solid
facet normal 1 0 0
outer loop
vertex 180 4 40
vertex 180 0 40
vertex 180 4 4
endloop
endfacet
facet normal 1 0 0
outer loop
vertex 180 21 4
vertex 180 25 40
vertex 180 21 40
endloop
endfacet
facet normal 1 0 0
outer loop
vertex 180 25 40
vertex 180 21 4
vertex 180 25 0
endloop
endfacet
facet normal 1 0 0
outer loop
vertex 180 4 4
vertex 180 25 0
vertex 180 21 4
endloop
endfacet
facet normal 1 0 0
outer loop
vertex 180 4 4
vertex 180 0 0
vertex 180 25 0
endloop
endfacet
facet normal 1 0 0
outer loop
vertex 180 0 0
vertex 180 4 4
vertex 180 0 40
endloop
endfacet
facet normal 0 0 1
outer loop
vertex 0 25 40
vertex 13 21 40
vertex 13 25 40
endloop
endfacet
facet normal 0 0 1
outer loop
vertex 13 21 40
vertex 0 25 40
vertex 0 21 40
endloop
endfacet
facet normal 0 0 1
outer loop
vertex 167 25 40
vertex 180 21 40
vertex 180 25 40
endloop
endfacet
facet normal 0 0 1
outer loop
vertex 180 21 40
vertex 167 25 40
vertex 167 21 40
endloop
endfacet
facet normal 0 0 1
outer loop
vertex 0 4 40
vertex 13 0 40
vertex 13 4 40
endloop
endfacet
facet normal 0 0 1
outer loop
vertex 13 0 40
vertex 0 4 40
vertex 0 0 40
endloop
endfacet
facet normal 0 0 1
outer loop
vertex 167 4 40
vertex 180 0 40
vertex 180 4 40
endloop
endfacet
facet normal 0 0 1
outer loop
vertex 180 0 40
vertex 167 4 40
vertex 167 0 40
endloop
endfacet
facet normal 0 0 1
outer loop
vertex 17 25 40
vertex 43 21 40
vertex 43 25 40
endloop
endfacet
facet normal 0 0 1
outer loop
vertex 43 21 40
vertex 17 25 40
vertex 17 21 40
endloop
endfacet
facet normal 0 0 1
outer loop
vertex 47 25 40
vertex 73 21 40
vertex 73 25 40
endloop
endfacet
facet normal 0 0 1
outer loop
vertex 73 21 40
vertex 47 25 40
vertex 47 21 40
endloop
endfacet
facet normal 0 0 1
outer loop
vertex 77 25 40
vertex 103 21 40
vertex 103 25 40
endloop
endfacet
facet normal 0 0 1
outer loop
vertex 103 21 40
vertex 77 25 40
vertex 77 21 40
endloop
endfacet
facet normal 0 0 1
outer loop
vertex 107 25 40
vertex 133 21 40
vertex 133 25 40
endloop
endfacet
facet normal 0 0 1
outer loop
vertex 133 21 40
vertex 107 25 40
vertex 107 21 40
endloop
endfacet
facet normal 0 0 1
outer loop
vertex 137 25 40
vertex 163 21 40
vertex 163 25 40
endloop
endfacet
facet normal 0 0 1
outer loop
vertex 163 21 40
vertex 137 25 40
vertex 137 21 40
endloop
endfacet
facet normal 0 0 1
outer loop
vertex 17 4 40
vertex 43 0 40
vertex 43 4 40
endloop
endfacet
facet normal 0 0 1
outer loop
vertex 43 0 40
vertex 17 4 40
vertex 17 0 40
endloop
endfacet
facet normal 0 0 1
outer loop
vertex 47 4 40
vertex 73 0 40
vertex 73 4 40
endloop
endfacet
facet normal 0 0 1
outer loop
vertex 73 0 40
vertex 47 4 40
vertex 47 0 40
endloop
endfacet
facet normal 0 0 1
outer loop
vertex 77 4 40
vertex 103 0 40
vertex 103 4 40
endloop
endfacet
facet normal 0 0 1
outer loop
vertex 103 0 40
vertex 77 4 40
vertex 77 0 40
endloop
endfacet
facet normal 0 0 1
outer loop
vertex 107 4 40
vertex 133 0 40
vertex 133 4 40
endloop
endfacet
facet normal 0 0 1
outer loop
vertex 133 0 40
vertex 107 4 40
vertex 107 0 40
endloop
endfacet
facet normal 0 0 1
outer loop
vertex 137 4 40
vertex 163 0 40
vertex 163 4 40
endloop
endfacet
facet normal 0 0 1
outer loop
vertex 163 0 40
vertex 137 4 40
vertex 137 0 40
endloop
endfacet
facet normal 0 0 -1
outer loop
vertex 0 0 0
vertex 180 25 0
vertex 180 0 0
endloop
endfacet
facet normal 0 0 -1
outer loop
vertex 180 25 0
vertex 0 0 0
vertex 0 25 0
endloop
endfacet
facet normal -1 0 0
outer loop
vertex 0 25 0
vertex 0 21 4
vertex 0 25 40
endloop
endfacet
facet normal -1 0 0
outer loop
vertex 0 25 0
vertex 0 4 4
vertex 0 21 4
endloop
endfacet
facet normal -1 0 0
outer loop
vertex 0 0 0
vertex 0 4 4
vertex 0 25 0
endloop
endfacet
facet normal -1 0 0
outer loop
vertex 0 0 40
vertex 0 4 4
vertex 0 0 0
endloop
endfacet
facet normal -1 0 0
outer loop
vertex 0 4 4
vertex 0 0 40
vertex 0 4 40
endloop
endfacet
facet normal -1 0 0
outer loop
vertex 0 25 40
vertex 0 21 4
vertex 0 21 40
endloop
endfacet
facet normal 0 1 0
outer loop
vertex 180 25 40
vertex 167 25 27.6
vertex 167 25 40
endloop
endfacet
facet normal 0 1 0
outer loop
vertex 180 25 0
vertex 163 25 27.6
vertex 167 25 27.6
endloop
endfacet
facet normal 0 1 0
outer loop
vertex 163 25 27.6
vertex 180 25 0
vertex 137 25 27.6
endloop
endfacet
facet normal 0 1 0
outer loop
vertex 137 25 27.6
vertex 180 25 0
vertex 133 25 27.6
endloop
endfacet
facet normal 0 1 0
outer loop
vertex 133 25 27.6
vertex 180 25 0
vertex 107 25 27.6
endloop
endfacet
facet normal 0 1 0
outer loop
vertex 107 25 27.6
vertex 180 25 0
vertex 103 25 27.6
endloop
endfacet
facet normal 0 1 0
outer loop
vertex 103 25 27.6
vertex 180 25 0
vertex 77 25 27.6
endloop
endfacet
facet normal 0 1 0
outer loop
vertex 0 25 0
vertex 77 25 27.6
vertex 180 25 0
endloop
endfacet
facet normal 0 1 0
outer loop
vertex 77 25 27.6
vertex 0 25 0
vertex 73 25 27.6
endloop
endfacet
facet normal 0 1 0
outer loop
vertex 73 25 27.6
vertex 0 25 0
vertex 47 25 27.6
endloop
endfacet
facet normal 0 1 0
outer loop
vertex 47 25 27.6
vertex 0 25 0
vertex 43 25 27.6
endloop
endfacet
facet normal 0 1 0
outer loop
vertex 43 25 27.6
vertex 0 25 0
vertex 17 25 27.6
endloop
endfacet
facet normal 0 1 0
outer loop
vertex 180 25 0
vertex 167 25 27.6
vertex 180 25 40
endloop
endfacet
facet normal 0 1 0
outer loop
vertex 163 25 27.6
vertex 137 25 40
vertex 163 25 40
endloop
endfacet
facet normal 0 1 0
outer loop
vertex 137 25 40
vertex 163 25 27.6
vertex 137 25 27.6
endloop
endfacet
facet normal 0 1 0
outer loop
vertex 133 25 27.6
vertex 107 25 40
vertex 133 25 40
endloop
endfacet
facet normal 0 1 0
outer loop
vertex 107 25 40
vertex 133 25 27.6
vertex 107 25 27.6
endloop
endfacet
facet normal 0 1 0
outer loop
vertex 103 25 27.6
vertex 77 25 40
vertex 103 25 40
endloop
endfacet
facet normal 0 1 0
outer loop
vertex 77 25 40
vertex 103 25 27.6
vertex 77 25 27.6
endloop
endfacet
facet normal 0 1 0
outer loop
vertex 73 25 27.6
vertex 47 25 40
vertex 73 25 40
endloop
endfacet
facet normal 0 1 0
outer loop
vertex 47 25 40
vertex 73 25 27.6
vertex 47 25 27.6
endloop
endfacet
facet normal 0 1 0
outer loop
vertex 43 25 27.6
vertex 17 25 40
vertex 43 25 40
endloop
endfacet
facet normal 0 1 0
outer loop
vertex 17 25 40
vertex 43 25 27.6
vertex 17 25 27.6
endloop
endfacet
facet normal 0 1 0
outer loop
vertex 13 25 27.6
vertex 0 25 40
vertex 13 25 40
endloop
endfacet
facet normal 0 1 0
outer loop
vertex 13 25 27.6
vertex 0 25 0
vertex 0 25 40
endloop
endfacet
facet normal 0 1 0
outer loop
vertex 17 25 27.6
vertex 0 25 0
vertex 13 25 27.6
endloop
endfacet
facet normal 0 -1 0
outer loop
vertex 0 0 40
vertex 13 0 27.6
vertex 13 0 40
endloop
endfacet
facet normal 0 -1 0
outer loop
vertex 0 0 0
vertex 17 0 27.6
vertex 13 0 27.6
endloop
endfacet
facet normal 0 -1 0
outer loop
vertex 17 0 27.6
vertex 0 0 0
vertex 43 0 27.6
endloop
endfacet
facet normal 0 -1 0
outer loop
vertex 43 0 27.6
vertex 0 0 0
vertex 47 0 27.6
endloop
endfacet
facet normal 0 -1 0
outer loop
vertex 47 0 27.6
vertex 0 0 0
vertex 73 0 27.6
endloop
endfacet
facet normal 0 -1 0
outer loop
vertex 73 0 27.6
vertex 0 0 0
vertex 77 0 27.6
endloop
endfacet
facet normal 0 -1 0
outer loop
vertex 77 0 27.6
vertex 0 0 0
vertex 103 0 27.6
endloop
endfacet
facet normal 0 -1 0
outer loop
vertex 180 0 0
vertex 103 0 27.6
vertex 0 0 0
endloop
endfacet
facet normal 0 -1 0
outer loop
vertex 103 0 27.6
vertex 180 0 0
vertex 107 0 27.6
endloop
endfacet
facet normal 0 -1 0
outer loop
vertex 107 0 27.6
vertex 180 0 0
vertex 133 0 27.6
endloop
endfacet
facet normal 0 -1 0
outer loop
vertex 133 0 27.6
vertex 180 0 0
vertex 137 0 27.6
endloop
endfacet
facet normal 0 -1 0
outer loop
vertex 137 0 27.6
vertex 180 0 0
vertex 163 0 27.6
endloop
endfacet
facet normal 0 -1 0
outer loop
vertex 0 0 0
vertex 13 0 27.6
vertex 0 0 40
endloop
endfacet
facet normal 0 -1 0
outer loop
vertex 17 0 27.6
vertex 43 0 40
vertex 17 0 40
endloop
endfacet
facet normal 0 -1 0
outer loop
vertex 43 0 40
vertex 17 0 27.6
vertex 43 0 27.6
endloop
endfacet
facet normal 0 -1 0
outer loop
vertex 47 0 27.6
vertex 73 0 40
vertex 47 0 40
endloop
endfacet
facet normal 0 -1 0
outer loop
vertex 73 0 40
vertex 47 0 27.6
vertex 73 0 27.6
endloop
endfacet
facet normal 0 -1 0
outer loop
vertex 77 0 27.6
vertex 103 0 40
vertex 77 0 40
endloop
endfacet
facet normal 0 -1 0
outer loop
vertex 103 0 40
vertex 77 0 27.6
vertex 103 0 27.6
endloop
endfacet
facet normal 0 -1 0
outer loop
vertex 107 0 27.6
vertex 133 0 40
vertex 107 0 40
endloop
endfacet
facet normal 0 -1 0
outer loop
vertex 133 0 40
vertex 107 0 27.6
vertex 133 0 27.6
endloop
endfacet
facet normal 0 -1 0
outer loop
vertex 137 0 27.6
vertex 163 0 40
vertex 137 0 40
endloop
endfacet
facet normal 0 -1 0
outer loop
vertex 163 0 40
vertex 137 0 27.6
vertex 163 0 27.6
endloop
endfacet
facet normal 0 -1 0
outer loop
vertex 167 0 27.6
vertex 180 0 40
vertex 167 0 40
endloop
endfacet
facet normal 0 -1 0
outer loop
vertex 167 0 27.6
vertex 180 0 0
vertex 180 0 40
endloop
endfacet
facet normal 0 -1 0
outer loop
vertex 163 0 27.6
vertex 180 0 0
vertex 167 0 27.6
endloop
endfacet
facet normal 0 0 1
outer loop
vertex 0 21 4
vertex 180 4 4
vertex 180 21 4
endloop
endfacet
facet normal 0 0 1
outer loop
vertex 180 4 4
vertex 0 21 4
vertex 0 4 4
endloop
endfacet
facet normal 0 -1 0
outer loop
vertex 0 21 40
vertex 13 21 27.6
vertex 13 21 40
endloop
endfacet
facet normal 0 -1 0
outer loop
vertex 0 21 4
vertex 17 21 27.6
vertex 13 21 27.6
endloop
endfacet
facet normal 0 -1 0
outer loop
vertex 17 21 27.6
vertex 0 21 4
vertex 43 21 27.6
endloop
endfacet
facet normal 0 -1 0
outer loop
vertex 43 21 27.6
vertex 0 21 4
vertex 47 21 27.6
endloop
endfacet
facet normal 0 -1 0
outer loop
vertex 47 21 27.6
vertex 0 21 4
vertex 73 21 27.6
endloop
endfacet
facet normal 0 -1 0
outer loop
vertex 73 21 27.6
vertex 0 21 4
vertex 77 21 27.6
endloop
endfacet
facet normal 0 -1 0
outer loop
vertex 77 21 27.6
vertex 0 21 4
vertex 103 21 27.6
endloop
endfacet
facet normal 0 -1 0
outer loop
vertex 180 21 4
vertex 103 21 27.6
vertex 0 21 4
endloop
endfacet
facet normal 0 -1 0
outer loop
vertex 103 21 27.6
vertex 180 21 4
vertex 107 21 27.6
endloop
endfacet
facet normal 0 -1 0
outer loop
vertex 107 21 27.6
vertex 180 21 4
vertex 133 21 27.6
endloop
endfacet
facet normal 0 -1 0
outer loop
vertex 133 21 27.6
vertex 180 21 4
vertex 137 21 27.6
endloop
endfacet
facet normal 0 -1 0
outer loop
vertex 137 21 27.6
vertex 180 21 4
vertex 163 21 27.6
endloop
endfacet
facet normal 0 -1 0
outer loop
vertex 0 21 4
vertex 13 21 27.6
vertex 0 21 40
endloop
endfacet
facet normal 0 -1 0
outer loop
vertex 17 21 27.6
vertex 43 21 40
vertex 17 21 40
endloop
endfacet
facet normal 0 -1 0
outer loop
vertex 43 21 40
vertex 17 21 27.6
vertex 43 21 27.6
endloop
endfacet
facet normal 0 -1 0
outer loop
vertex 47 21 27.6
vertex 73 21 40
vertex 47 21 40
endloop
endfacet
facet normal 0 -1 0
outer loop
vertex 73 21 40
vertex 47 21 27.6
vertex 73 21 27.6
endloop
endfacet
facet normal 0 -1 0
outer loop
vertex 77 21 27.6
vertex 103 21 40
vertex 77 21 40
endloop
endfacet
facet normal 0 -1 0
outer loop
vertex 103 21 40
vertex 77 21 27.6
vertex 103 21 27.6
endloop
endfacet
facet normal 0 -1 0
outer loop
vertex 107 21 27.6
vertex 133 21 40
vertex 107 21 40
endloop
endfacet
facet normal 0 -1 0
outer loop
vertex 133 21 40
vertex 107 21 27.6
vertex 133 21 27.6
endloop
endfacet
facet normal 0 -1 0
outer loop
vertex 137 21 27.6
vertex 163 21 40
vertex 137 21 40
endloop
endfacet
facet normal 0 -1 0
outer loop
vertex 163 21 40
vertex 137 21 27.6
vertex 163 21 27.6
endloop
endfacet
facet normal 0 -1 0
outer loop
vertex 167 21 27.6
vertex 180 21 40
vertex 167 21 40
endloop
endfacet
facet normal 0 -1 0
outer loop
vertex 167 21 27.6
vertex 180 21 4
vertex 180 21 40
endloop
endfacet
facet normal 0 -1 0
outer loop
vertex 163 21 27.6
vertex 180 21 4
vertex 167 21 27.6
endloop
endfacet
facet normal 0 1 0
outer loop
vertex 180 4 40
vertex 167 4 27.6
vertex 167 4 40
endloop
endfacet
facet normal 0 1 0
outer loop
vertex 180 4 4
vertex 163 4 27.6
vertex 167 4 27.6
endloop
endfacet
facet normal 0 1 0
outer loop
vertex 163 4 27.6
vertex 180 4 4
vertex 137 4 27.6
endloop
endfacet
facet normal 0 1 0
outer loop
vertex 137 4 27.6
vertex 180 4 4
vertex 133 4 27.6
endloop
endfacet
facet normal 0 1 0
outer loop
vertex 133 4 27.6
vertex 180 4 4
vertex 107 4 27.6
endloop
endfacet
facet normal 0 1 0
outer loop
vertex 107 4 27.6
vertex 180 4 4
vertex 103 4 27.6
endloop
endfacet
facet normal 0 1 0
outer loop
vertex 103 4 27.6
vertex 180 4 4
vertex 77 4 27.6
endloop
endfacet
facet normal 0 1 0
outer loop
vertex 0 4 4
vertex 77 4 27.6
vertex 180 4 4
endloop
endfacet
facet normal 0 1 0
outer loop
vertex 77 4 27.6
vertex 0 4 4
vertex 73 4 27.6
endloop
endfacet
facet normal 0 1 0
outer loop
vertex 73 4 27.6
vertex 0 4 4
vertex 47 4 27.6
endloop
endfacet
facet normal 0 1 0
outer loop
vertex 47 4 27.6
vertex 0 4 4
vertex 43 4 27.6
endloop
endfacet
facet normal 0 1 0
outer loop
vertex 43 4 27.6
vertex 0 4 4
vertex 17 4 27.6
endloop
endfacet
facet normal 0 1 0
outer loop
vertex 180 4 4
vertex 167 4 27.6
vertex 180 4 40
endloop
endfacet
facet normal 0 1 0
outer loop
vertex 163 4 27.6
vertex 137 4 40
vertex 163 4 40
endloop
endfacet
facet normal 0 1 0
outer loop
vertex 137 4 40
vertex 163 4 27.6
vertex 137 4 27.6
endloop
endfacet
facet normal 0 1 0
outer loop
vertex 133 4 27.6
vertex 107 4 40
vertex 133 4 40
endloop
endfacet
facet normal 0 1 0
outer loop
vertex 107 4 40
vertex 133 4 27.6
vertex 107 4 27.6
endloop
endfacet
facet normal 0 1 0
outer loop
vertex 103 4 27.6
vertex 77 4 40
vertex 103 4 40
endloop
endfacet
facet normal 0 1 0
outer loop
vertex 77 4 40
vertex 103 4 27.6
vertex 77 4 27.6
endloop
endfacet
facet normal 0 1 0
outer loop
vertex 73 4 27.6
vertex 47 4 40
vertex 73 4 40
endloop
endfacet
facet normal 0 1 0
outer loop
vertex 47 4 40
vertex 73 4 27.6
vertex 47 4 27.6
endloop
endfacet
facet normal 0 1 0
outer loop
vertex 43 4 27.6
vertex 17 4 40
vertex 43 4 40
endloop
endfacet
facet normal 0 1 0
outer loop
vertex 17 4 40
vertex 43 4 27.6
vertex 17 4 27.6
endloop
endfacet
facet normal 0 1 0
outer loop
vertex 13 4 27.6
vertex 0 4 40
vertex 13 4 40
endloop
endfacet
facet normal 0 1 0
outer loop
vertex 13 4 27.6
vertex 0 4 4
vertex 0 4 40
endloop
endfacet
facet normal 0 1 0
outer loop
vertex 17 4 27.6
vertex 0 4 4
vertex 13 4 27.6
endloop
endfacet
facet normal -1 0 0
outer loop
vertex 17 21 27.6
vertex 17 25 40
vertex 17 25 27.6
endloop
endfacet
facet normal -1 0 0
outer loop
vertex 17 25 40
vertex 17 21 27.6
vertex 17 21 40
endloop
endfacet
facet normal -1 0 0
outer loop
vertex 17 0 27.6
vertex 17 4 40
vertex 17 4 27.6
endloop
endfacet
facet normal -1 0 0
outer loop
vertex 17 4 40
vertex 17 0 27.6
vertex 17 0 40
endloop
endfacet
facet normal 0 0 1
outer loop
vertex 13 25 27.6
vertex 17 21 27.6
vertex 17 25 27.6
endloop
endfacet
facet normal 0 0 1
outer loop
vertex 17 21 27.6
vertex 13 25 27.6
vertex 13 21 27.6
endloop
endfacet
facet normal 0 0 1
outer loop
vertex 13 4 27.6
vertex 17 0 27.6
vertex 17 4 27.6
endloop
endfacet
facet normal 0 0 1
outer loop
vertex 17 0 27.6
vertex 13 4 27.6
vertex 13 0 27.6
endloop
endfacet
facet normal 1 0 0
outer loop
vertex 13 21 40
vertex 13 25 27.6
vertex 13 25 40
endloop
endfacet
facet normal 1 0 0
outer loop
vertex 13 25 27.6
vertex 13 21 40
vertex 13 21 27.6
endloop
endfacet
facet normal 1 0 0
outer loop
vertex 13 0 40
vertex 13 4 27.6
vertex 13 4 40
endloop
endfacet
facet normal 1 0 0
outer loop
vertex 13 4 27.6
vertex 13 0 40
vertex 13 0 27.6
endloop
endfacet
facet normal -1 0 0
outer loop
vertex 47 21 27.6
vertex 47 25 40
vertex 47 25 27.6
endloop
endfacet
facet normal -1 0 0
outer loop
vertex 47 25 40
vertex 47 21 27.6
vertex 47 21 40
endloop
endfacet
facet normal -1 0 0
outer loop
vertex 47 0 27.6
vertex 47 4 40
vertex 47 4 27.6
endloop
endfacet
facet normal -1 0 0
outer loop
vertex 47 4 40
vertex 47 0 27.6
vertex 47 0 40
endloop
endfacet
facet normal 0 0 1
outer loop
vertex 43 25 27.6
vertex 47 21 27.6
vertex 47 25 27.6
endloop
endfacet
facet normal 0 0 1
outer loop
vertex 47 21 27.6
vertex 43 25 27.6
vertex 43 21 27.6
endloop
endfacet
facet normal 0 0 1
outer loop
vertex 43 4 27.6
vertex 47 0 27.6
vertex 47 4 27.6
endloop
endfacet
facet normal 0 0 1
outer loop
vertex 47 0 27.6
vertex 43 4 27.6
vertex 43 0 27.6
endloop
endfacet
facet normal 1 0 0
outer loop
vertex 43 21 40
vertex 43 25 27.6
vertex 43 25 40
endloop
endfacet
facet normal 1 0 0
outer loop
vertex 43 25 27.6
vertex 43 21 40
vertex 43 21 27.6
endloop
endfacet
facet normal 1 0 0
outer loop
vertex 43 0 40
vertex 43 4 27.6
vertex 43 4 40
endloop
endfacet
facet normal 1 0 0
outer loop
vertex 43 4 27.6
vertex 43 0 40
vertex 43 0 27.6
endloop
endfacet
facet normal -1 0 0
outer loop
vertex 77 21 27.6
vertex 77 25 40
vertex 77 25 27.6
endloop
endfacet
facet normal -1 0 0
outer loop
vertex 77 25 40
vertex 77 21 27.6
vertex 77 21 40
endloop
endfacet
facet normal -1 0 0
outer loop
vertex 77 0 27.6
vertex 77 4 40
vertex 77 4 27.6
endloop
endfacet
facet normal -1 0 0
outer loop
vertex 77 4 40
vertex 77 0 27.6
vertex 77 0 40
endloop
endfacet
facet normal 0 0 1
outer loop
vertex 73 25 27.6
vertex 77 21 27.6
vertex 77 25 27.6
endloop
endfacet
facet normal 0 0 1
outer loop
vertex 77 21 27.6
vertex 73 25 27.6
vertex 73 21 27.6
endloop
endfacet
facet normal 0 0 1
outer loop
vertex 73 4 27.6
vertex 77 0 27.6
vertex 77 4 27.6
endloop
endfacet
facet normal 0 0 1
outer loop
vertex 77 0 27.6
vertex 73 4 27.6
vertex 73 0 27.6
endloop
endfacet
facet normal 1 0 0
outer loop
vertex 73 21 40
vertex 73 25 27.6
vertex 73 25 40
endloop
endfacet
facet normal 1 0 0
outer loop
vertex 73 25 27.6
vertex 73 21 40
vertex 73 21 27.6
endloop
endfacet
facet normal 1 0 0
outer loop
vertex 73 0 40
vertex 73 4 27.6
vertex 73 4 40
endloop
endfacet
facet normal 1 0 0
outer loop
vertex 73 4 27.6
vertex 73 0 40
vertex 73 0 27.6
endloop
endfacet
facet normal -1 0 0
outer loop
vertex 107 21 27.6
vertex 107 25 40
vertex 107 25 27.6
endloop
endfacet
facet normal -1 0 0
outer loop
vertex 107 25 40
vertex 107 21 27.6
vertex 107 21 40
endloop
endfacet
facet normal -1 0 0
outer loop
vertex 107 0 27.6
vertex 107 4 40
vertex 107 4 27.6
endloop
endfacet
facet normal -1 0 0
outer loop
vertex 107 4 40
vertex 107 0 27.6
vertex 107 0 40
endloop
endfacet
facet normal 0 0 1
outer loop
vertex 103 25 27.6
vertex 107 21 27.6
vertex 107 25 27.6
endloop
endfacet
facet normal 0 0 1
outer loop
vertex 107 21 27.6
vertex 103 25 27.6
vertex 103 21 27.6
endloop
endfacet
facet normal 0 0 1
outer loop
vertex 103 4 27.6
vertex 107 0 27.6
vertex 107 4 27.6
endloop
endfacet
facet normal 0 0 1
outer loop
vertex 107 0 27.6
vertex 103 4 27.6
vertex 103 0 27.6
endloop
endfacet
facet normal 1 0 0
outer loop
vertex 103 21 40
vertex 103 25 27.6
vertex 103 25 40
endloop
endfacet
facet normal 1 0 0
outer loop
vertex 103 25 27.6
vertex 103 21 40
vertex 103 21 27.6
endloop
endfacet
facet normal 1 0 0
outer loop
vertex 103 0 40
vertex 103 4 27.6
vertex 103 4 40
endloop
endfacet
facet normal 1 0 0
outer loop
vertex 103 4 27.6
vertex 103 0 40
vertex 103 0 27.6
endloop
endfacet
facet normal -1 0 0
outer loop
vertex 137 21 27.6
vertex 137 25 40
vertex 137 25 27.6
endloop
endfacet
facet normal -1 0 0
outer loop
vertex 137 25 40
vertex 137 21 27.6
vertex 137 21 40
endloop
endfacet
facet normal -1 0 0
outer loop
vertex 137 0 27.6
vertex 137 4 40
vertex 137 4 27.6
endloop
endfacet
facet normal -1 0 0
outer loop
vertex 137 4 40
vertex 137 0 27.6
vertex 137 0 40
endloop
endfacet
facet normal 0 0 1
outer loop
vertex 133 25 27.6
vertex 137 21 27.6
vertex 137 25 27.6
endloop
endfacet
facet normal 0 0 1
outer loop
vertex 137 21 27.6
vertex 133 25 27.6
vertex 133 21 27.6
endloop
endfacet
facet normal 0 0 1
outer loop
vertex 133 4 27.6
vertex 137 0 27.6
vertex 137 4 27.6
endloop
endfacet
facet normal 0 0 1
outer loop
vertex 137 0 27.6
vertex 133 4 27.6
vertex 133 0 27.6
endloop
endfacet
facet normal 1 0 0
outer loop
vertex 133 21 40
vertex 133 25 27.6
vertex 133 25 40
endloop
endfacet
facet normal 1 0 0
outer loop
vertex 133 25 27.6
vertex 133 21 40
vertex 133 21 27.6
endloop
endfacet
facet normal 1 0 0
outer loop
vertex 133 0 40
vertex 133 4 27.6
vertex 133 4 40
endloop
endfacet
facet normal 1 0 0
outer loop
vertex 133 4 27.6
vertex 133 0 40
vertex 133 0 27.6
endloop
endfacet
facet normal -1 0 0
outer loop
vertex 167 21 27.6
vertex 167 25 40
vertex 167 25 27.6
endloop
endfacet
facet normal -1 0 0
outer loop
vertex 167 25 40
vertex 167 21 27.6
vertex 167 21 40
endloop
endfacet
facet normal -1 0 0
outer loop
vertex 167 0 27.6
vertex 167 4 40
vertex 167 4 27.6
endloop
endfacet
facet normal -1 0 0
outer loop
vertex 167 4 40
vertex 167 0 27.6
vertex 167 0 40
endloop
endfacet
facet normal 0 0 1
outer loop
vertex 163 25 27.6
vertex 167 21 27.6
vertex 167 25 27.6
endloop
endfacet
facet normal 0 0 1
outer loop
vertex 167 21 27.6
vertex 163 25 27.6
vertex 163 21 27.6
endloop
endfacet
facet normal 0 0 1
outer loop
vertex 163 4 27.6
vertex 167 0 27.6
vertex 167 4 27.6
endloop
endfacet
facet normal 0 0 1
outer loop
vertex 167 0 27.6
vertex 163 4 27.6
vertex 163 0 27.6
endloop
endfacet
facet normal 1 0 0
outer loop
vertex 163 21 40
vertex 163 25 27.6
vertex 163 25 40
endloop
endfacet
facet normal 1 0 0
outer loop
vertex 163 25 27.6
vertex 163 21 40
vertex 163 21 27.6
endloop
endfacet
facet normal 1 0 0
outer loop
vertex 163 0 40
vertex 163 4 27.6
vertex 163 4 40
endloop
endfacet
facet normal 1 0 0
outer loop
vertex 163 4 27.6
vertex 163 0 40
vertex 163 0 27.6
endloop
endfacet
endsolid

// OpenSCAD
$fn = 32;

// ----------------------------------------------------------------------
// Cable duct: 180 x 25 x 40 mm, 6 fingers
// ----------------------------------------------------------------------

// --- parameters (mm) ---
tray_len = 180;           // duct length, X
tray_w = 25;              // duct width, Y
tray_h = 40;              // duct height, Z
tray_t = 4;               // side wall thickness
floor_t = 4;              // floor thickness
slot_w = 4;               // finger slot width
slot_h = 23.6;            // finger slot height
fingers = 6;              // number of finger slots per side
pitch = 30;               // finger pitch

module shell() {
  difference() {
    cube([tray_len, tray_w, tray_h]);
    /* open top channel */
    translate([-tray_t - 1, tray_t, floor_t])
      cube([tray_len + 2 * tray_t + 2, tray_w - 2 * tray_t, tray_h + 1]);
  }
}

difference() {
  union() {
    shell();
  }
  /* finger slots cut through both side walls */
  for (i = [0 : fingers - 1]) translate([pitch / 2 + i * pitch - slot_w / 2, -1, floor_t + slot_h]) cube([slot_w, tray_w + 2, tray_h]);
}
